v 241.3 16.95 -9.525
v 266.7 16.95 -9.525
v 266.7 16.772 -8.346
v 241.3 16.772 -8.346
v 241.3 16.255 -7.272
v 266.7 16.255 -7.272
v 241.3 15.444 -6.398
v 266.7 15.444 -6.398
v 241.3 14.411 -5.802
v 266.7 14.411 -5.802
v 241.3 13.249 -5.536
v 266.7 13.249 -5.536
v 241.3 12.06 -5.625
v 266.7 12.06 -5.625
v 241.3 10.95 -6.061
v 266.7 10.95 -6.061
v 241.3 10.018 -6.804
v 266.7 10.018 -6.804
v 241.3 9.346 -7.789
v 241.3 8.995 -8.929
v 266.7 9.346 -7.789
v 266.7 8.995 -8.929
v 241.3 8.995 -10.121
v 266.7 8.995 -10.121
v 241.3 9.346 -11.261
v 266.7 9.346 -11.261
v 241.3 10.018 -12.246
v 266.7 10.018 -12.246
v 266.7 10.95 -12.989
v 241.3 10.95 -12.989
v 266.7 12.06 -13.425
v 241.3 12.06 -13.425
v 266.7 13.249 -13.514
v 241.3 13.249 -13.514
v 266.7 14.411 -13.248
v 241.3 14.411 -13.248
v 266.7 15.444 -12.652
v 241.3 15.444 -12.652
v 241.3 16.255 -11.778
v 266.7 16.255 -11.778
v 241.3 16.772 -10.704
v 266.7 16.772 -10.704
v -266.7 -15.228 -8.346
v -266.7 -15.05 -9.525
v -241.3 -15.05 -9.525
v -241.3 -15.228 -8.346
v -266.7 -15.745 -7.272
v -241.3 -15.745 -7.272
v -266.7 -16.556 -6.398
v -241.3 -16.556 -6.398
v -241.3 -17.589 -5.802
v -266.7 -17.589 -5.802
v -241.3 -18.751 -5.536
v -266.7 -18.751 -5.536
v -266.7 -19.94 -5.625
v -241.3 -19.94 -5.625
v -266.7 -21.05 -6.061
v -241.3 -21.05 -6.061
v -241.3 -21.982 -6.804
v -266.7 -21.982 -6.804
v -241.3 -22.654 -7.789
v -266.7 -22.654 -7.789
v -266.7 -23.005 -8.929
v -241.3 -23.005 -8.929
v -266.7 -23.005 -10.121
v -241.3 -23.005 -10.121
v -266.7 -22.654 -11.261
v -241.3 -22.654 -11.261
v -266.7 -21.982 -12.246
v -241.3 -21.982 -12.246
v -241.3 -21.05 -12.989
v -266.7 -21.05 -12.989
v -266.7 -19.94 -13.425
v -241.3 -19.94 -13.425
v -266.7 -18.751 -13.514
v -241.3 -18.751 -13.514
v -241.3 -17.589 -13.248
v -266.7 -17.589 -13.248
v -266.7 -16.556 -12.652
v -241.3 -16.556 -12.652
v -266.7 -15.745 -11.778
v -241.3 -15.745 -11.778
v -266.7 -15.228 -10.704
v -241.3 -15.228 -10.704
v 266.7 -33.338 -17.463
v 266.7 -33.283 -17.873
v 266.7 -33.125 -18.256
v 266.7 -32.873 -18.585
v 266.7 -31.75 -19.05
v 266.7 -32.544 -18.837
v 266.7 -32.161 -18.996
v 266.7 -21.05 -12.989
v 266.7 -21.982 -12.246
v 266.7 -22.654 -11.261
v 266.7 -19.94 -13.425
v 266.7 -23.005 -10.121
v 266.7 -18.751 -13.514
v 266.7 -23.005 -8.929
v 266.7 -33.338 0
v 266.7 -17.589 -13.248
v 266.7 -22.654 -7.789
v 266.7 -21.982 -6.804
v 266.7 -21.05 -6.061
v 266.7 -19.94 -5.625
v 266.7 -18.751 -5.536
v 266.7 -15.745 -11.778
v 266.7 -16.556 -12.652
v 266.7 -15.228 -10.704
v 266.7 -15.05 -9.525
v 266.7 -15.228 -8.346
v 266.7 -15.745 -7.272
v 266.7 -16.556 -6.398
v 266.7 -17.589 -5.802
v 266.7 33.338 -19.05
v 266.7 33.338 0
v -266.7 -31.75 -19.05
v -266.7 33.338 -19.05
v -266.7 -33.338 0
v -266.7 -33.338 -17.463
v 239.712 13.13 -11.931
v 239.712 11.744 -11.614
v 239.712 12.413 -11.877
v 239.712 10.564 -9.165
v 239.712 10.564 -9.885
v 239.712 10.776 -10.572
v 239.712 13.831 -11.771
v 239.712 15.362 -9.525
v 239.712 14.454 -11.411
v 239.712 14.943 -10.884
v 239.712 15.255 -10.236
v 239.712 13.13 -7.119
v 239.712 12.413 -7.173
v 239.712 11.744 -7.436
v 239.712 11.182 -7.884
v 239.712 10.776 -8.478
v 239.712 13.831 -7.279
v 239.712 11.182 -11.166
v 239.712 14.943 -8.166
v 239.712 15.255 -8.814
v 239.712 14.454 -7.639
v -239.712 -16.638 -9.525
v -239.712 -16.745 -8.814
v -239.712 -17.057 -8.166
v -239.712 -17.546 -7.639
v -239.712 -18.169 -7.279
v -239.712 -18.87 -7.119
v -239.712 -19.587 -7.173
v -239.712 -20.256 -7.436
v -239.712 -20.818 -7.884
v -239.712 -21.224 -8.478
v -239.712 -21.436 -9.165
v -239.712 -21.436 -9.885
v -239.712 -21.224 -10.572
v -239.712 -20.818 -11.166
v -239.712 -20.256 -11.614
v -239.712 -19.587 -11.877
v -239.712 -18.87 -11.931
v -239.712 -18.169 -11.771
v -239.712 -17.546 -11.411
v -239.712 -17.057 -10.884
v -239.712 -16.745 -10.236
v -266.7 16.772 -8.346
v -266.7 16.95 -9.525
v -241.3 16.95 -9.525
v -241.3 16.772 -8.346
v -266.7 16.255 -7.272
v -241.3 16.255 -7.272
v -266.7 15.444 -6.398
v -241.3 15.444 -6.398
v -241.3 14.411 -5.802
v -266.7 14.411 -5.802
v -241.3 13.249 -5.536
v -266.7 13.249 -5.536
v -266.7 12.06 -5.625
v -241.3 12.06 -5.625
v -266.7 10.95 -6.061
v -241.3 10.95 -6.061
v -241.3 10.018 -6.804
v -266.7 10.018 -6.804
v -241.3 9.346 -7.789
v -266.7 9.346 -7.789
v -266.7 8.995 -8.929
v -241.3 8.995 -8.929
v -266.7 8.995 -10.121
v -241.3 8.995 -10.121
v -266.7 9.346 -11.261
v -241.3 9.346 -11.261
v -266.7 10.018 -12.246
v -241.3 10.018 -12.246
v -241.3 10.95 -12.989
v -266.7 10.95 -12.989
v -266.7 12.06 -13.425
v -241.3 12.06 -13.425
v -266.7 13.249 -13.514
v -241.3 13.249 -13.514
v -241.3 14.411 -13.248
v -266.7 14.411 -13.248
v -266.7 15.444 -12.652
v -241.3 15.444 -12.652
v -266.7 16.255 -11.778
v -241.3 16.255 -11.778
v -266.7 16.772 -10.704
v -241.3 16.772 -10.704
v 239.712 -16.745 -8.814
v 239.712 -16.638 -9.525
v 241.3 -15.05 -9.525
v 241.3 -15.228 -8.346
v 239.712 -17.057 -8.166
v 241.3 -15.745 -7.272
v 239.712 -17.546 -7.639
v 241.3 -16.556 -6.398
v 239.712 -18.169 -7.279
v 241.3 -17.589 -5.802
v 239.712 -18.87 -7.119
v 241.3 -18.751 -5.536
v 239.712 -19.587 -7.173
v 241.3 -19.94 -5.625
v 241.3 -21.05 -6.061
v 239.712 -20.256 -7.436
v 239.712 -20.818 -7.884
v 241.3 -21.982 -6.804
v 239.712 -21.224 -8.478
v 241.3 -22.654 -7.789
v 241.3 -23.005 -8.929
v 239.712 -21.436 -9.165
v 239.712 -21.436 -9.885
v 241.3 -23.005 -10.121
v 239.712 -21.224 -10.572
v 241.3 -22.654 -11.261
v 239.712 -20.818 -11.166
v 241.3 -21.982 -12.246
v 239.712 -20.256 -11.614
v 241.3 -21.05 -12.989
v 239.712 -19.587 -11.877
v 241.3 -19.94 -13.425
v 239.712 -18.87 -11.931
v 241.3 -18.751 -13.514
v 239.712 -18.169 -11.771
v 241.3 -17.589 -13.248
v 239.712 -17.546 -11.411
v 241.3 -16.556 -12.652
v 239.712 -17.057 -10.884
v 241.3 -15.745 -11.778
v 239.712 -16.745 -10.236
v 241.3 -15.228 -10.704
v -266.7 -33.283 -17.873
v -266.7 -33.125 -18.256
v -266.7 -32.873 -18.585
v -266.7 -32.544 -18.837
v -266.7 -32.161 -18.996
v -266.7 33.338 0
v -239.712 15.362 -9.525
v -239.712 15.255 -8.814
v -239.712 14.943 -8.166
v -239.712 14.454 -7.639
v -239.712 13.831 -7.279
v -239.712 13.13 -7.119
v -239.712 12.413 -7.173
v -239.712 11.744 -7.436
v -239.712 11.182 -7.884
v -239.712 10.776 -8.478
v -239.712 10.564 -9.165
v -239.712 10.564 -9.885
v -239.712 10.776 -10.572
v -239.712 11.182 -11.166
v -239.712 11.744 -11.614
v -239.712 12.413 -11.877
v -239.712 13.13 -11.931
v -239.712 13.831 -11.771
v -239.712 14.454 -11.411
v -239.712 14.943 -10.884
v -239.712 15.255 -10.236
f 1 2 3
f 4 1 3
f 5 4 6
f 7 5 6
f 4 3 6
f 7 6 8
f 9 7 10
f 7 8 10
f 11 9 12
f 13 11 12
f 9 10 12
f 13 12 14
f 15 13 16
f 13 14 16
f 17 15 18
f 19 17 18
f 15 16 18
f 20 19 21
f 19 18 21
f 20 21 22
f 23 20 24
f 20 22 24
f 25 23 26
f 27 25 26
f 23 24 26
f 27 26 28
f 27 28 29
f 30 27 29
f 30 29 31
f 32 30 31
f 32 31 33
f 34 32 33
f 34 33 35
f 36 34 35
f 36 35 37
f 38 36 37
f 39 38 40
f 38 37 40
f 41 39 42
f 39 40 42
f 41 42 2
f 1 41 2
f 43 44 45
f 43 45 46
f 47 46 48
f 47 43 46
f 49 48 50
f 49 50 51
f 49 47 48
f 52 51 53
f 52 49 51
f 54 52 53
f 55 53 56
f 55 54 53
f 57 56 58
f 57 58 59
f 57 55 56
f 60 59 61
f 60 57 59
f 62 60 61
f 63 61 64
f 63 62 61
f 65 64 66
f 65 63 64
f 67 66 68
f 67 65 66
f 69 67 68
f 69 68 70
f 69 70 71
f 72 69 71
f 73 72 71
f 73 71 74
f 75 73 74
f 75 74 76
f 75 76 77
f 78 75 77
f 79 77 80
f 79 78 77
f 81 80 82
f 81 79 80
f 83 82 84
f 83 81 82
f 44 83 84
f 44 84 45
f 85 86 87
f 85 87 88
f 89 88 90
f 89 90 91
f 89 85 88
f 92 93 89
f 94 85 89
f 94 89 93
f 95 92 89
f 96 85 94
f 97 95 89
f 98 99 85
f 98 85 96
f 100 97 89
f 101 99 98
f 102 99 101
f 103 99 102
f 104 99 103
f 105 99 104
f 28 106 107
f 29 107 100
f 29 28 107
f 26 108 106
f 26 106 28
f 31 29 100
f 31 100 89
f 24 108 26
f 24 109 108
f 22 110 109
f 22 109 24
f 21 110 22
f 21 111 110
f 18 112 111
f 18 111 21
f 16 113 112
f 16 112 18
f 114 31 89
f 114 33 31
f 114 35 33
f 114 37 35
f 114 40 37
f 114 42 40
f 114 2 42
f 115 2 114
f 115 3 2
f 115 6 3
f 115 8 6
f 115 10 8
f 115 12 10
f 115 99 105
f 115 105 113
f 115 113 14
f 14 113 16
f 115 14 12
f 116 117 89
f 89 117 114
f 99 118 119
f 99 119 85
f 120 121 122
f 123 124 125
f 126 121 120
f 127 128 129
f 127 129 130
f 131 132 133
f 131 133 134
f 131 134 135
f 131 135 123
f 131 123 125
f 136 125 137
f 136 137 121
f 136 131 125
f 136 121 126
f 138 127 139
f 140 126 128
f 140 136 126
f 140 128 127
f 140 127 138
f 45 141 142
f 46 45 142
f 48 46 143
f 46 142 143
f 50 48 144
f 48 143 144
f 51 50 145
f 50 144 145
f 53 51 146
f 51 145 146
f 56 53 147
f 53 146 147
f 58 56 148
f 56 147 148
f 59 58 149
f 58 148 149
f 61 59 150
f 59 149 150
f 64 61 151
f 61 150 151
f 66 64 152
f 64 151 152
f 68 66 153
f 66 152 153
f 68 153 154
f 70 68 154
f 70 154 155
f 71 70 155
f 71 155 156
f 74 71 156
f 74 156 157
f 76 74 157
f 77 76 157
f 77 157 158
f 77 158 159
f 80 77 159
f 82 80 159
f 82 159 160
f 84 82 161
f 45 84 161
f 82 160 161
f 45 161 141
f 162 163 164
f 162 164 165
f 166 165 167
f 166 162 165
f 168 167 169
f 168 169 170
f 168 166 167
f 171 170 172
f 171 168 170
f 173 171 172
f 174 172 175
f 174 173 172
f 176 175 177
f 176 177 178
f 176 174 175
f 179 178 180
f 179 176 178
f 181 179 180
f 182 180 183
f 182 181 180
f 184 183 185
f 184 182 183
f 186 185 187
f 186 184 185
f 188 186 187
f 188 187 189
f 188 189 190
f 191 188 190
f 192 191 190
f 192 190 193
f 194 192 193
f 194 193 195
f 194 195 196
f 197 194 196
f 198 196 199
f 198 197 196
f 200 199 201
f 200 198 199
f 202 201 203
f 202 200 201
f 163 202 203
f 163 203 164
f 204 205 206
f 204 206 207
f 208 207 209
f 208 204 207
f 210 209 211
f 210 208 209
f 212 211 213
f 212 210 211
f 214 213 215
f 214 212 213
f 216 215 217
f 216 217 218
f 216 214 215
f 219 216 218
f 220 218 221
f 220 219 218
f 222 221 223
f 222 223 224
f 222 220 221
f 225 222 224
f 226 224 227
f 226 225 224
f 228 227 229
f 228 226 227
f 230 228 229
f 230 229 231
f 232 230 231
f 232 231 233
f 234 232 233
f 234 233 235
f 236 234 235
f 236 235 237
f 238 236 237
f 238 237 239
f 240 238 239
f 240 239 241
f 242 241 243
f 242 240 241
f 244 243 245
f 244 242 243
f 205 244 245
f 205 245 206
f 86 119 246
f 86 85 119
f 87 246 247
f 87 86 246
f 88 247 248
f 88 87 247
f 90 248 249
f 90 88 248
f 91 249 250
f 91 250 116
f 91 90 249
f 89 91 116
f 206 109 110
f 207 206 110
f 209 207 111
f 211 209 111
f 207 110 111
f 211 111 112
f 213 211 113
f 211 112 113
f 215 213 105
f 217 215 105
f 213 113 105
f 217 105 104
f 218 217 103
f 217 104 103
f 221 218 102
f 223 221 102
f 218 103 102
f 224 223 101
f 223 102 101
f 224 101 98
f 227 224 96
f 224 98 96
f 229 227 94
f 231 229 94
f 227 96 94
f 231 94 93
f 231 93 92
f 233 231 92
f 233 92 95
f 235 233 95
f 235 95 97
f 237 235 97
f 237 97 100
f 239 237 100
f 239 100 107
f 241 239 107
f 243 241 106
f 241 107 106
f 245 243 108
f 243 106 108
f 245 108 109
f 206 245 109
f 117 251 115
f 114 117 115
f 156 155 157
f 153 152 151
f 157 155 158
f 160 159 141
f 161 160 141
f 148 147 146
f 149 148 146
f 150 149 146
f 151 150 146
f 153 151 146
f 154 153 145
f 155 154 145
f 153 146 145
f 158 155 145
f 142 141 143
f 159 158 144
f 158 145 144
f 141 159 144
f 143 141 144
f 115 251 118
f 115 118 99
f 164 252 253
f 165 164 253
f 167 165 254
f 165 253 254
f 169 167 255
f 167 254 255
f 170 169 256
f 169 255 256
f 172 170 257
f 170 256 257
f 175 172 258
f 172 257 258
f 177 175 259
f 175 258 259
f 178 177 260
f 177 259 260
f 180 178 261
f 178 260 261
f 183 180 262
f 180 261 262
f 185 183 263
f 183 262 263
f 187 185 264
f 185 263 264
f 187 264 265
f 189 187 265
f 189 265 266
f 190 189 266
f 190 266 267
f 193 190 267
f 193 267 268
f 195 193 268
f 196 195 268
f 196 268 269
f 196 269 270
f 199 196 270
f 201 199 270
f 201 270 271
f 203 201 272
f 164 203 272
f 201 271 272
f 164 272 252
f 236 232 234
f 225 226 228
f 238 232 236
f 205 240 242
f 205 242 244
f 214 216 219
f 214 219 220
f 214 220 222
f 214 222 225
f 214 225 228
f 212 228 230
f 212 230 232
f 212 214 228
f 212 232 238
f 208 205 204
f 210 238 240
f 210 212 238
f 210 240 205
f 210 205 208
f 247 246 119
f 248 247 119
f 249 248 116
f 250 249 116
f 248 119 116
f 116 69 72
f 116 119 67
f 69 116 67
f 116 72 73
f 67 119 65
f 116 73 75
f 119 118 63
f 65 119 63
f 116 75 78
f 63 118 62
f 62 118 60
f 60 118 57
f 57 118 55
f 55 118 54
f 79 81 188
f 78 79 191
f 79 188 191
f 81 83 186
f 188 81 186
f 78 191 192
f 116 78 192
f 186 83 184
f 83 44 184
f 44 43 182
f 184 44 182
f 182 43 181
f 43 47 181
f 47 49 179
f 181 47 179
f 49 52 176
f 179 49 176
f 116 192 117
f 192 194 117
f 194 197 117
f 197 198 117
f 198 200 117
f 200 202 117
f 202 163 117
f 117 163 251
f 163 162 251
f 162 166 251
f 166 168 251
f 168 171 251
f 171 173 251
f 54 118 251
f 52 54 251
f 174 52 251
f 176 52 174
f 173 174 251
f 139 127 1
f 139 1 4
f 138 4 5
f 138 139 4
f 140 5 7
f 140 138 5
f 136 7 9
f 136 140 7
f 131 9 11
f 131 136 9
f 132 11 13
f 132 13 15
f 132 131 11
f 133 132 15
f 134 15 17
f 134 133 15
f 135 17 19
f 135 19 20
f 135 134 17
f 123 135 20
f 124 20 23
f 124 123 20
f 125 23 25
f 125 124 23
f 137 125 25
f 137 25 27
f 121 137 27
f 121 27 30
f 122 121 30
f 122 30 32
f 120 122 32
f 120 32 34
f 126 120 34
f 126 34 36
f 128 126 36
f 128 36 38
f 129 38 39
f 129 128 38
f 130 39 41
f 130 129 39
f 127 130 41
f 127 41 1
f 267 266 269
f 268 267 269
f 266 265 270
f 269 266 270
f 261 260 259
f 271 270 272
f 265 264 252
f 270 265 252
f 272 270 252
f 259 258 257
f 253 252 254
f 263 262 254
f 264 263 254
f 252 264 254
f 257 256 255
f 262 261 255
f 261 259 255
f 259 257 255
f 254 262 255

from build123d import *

# Parameters (mm, degrees)
F0_W     = 533.4
F0_H     = 66.675
F1_DEPTH = 19.05
F3_R     = 4
F4_DEPTH = 26.9875
F5_SIZE  = 1.5875
F10_R    = 1.5875


with BuildPart() as f1:
    # F0 (on Top) → F1 (new body)
    with BuildSketch(Plane.XY):
        Rectangle(F0_W, F0_H)
    extrude(amount=-F1_DEPTH)


with BuildPart() as f4:
    # F3 (on Right) → F4 (new body)
    with BuildSketch(Plane.YZ):
        Circle(F3_R)
    extrude(amount=-F4_DEPTH)

    # F5
    f5_edges = [f4.edges().sort_by_distance(p)[0] for p in [
        (-26.9875, -4, 0),
    ]]
    chamfer(f5_edges, length=F5_SIZE)


with BuildPart() as f6_1:
    # F6: copy of F4
    add(f4.part.moved(Location((266.7, -19.05, -9.525))))


with BuildPart() as f4_1:
    # F7: moved
    add(f4.part.moved(Location((266.7, 12.95, -9.525))))


with BuildPart() as f8_1:
    # F8: instance of F4
    add(f4_1.part.mirror(Plane.YZ))


with BuildPart() as f8_2:
    # F8: instance of F6_1
    add(f6_1.part.mirror(Plane.YZ))


with BuildPart() as f1_1:
    add(f1.part)

    # F9: cut F8_2, F8_1, F6_1, F4
    add(f8_2.part, mode=Mode.SUBTRACT)
    add(f8_1.part, mode=Mode.SUBTRACT)
    add(f6_1.part, mode=Mode.SUBTRACT)
    add(f4_1.part, mode=Mode.SUBTRACT)

    # F10
    f10_edges = [f1_1.edges().sort_by_distance(p)[0] for p in [
        (0, -33.3375, -19.05),
    ]]
    fillet(f10_edges, radius=F10_R)


solid = f1_1.part
